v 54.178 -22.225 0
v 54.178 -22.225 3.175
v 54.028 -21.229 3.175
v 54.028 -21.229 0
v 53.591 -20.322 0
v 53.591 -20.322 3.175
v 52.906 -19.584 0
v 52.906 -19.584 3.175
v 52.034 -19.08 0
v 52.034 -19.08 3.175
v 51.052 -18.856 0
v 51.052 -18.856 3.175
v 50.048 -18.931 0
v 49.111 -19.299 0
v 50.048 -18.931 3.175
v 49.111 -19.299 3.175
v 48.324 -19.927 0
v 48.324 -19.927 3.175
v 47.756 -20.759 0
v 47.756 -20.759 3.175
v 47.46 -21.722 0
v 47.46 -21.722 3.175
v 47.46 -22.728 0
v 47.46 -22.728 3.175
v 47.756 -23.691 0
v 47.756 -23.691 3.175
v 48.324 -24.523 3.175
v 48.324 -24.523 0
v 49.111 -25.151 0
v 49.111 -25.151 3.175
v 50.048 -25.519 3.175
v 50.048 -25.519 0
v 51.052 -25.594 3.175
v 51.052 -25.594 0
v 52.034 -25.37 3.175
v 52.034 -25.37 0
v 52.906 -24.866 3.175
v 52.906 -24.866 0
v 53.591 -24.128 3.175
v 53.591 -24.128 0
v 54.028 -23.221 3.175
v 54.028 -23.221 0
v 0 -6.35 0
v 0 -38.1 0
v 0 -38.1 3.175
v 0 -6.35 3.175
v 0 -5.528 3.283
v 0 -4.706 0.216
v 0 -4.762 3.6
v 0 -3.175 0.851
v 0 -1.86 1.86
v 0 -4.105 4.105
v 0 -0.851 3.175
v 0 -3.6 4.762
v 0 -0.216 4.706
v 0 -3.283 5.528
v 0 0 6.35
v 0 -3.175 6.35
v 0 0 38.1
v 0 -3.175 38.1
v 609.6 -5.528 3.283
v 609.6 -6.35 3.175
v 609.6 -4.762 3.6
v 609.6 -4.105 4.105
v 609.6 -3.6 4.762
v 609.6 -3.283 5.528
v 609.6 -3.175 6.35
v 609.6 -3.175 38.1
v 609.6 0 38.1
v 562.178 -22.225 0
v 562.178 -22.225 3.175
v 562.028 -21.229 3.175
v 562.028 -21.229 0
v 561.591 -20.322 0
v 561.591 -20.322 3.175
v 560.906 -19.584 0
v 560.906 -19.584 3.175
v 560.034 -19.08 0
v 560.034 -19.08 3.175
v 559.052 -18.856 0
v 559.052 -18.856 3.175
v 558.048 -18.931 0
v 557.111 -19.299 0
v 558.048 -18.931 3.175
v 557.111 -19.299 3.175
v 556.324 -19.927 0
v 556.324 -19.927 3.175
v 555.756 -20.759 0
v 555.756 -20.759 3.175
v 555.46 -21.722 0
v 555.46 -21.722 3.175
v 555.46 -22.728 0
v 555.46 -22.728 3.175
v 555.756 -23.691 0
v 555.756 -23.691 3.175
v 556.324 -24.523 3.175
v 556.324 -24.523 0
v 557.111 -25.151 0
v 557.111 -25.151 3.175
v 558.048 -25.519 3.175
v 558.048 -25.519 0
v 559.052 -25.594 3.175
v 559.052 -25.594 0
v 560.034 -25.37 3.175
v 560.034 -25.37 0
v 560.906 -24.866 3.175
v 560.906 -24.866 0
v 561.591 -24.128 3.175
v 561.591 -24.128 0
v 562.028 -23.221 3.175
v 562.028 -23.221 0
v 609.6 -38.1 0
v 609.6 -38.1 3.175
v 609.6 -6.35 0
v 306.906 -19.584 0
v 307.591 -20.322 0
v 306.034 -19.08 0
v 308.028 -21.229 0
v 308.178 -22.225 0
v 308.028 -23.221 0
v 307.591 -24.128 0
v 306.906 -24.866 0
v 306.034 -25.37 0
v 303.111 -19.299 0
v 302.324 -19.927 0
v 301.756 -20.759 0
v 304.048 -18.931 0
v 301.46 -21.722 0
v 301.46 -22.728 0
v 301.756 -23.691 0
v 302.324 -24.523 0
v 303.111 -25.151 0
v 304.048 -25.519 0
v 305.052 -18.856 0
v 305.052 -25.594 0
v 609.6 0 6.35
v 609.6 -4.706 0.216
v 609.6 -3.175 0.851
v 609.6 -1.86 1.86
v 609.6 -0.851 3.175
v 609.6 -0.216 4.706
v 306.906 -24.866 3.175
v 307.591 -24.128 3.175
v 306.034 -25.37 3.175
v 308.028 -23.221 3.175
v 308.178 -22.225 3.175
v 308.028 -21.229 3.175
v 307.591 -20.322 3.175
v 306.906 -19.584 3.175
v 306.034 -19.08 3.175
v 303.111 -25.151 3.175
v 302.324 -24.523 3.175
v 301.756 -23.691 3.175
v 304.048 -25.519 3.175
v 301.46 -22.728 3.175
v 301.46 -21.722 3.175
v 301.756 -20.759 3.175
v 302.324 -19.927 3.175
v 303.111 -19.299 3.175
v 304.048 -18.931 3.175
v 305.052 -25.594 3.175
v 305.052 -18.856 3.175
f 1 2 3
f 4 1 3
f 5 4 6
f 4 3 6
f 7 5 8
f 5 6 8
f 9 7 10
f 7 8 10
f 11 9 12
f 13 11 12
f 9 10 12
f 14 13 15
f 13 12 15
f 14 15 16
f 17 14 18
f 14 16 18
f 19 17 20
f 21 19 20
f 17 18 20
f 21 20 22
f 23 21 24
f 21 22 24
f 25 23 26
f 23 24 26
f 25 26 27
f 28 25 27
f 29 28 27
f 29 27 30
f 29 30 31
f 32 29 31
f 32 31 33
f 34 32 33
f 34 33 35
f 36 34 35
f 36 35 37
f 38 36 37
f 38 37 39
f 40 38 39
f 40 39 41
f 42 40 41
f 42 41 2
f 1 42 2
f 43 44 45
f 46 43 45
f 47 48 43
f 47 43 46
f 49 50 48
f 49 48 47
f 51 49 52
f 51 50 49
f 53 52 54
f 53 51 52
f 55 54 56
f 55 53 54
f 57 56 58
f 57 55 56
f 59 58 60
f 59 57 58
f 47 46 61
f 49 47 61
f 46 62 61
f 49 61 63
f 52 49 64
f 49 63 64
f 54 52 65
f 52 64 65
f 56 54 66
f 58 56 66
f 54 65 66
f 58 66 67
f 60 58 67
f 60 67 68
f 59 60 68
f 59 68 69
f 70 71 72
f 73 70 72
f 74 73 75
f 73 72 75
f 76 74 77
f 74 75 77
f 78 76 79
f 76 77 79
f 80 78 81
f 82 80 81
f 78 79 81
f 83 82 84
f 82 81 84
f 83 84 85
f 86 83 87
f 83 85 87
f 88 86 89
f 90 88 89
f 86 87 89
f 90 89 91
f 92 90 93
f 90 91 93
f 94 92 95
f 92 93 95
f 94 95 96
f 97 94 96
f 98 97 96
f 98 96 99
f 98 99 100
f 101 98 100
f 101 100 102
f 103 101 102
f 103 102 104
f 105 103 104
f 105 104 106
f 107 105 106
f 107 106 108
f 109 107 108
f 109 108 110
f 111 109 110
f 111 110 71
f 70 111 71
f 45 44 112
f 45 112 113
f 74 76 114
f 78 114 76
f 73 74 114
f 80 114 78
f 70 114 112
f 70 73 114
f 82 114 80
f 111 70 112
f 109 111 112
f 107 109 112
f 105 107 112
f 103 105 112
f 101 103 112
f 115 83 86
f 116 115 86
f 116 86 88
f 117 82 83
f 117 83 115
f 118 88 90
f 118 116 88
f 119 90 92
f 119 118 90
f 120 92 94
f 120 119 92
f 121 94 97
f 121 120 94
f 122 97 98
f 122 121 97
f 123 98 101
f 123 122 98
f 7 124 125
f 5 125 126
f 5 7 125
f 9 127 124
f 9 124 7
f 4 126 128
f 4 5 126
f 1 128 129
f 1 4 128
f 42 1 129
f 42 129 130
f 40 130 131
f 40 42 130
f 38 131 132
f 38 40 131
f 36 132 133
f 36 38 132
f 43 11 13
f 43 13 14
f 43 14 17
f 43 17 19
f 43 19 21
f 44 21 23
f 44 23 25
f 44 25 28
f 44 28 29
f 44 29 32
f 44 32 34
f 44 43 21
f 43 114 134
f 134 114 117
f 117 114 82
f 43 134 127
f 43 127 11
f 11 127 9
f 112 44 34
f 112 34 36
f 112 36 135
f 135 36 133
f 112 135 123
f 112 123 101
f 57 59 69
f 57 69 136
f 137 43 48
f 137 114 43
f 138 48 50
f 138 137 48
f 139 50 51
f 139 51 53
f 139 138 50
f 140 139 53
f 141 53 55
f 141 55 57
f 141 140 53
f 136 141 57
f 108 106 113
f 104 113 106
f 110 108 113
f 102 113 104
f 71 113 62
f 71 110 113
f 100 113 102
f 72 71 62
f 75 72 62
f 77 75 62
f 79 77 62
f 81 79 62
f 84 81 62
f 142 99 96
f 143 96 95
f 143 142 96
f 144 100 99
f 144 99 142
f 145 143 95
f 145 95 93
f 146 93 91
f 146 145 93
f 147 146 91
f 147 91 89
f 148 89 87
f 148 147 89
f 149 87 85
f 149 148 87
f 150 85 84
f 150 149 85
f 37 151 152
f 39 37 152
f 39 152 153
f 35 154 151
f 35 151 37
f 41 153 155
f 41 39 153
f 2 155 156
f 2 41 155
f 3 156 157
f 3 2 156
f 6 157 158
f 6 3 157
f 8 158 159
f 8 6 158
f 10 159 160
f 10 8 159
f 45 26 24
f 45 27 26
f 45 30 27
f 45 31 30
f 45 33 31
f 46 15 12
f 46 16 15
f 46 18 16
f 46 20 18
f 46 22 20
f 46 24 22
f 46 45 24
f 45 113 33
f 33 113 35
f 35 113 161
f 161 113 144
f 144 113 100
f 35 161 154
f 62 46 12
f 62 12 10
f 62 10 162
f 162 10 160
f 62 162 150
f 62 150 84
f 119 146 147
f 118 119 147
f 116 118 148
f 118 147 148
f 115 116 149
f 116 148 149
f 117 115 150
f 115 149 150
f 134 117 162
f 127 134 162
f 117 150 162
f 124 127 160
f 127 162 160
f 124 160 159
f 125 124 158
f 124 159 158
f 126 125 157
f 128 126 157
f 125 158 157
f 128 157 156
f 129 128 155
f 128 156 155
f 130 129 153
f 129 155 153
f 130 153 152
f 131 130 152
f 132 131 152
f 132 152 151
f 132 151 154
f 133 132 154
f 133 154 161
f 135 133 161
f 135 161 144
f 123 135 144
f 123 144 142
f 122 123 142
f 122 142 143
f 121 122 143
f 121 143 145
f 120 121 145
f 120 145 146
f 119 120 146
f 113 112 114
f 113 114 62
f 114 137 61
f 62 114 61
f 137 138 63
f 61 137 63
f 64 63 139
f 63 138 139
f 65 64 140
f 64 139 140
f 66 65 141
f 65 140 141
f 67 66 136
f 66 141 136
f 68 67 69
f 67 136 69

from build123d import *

# Parameters (mm, degrees)
BOSS_EXTRUDE1_DEPTH = 609.6
FILLET1_R           = 3.175
FILLET2_R           = 6.35
SKETCH3_R           = 3.3782
CUT_EXTRUDE1_DEPTH  = 4.175


with BuildPart() as part:
    # Sketch2 → Boss-Extrude1 (new body)
    with BuildSketch(Plane(origin=(0, 0, 0), x_dir=(0, 0, -1), z_dir=(1, 0, 0))):
        Polygon((-38.1, 0), (0, 0), (0, -38.1), (-3.175, -38.1), (-3.175, -3.175), (-38.1, -3.175), align=None)
    extrude(amount=BOSS_EXTRUDE1_DEPTH)

    # Fillet1
    fillet1_edges = [part.edges().sort_by_distance(p)[0] for p in [
        (304.8, -3.175, 3.175),
    ]]
    fillet(fillet1_edges, radius=FILLET1_R)

    # Fillet2
    fillet2_edges = [part.edges().sort_by_distance(p)[0] for p in [
        (304.8, 0, 0),
    ]]
    fillet(fillet2_edges, radius=FILLET2_R)

    # Sketch3 → Cut-Extrude1 (cut, through all)
    with BuildSketch(Plane.XY.offset(3.175)):
        with Locations((304.8, -22.225)):
            Circle(SKETCH3_R)
        with Locations((558.8, -22.225)):
            Circle(SKETCH3_R)
        with Locations((50.8, -22.225)):
            Circle(SKETCH3_R)
    extrude(amount=-CUT_EXTRUDE1_DEPTH, mode=Mode.SUBTRACT)


solid = part.part
